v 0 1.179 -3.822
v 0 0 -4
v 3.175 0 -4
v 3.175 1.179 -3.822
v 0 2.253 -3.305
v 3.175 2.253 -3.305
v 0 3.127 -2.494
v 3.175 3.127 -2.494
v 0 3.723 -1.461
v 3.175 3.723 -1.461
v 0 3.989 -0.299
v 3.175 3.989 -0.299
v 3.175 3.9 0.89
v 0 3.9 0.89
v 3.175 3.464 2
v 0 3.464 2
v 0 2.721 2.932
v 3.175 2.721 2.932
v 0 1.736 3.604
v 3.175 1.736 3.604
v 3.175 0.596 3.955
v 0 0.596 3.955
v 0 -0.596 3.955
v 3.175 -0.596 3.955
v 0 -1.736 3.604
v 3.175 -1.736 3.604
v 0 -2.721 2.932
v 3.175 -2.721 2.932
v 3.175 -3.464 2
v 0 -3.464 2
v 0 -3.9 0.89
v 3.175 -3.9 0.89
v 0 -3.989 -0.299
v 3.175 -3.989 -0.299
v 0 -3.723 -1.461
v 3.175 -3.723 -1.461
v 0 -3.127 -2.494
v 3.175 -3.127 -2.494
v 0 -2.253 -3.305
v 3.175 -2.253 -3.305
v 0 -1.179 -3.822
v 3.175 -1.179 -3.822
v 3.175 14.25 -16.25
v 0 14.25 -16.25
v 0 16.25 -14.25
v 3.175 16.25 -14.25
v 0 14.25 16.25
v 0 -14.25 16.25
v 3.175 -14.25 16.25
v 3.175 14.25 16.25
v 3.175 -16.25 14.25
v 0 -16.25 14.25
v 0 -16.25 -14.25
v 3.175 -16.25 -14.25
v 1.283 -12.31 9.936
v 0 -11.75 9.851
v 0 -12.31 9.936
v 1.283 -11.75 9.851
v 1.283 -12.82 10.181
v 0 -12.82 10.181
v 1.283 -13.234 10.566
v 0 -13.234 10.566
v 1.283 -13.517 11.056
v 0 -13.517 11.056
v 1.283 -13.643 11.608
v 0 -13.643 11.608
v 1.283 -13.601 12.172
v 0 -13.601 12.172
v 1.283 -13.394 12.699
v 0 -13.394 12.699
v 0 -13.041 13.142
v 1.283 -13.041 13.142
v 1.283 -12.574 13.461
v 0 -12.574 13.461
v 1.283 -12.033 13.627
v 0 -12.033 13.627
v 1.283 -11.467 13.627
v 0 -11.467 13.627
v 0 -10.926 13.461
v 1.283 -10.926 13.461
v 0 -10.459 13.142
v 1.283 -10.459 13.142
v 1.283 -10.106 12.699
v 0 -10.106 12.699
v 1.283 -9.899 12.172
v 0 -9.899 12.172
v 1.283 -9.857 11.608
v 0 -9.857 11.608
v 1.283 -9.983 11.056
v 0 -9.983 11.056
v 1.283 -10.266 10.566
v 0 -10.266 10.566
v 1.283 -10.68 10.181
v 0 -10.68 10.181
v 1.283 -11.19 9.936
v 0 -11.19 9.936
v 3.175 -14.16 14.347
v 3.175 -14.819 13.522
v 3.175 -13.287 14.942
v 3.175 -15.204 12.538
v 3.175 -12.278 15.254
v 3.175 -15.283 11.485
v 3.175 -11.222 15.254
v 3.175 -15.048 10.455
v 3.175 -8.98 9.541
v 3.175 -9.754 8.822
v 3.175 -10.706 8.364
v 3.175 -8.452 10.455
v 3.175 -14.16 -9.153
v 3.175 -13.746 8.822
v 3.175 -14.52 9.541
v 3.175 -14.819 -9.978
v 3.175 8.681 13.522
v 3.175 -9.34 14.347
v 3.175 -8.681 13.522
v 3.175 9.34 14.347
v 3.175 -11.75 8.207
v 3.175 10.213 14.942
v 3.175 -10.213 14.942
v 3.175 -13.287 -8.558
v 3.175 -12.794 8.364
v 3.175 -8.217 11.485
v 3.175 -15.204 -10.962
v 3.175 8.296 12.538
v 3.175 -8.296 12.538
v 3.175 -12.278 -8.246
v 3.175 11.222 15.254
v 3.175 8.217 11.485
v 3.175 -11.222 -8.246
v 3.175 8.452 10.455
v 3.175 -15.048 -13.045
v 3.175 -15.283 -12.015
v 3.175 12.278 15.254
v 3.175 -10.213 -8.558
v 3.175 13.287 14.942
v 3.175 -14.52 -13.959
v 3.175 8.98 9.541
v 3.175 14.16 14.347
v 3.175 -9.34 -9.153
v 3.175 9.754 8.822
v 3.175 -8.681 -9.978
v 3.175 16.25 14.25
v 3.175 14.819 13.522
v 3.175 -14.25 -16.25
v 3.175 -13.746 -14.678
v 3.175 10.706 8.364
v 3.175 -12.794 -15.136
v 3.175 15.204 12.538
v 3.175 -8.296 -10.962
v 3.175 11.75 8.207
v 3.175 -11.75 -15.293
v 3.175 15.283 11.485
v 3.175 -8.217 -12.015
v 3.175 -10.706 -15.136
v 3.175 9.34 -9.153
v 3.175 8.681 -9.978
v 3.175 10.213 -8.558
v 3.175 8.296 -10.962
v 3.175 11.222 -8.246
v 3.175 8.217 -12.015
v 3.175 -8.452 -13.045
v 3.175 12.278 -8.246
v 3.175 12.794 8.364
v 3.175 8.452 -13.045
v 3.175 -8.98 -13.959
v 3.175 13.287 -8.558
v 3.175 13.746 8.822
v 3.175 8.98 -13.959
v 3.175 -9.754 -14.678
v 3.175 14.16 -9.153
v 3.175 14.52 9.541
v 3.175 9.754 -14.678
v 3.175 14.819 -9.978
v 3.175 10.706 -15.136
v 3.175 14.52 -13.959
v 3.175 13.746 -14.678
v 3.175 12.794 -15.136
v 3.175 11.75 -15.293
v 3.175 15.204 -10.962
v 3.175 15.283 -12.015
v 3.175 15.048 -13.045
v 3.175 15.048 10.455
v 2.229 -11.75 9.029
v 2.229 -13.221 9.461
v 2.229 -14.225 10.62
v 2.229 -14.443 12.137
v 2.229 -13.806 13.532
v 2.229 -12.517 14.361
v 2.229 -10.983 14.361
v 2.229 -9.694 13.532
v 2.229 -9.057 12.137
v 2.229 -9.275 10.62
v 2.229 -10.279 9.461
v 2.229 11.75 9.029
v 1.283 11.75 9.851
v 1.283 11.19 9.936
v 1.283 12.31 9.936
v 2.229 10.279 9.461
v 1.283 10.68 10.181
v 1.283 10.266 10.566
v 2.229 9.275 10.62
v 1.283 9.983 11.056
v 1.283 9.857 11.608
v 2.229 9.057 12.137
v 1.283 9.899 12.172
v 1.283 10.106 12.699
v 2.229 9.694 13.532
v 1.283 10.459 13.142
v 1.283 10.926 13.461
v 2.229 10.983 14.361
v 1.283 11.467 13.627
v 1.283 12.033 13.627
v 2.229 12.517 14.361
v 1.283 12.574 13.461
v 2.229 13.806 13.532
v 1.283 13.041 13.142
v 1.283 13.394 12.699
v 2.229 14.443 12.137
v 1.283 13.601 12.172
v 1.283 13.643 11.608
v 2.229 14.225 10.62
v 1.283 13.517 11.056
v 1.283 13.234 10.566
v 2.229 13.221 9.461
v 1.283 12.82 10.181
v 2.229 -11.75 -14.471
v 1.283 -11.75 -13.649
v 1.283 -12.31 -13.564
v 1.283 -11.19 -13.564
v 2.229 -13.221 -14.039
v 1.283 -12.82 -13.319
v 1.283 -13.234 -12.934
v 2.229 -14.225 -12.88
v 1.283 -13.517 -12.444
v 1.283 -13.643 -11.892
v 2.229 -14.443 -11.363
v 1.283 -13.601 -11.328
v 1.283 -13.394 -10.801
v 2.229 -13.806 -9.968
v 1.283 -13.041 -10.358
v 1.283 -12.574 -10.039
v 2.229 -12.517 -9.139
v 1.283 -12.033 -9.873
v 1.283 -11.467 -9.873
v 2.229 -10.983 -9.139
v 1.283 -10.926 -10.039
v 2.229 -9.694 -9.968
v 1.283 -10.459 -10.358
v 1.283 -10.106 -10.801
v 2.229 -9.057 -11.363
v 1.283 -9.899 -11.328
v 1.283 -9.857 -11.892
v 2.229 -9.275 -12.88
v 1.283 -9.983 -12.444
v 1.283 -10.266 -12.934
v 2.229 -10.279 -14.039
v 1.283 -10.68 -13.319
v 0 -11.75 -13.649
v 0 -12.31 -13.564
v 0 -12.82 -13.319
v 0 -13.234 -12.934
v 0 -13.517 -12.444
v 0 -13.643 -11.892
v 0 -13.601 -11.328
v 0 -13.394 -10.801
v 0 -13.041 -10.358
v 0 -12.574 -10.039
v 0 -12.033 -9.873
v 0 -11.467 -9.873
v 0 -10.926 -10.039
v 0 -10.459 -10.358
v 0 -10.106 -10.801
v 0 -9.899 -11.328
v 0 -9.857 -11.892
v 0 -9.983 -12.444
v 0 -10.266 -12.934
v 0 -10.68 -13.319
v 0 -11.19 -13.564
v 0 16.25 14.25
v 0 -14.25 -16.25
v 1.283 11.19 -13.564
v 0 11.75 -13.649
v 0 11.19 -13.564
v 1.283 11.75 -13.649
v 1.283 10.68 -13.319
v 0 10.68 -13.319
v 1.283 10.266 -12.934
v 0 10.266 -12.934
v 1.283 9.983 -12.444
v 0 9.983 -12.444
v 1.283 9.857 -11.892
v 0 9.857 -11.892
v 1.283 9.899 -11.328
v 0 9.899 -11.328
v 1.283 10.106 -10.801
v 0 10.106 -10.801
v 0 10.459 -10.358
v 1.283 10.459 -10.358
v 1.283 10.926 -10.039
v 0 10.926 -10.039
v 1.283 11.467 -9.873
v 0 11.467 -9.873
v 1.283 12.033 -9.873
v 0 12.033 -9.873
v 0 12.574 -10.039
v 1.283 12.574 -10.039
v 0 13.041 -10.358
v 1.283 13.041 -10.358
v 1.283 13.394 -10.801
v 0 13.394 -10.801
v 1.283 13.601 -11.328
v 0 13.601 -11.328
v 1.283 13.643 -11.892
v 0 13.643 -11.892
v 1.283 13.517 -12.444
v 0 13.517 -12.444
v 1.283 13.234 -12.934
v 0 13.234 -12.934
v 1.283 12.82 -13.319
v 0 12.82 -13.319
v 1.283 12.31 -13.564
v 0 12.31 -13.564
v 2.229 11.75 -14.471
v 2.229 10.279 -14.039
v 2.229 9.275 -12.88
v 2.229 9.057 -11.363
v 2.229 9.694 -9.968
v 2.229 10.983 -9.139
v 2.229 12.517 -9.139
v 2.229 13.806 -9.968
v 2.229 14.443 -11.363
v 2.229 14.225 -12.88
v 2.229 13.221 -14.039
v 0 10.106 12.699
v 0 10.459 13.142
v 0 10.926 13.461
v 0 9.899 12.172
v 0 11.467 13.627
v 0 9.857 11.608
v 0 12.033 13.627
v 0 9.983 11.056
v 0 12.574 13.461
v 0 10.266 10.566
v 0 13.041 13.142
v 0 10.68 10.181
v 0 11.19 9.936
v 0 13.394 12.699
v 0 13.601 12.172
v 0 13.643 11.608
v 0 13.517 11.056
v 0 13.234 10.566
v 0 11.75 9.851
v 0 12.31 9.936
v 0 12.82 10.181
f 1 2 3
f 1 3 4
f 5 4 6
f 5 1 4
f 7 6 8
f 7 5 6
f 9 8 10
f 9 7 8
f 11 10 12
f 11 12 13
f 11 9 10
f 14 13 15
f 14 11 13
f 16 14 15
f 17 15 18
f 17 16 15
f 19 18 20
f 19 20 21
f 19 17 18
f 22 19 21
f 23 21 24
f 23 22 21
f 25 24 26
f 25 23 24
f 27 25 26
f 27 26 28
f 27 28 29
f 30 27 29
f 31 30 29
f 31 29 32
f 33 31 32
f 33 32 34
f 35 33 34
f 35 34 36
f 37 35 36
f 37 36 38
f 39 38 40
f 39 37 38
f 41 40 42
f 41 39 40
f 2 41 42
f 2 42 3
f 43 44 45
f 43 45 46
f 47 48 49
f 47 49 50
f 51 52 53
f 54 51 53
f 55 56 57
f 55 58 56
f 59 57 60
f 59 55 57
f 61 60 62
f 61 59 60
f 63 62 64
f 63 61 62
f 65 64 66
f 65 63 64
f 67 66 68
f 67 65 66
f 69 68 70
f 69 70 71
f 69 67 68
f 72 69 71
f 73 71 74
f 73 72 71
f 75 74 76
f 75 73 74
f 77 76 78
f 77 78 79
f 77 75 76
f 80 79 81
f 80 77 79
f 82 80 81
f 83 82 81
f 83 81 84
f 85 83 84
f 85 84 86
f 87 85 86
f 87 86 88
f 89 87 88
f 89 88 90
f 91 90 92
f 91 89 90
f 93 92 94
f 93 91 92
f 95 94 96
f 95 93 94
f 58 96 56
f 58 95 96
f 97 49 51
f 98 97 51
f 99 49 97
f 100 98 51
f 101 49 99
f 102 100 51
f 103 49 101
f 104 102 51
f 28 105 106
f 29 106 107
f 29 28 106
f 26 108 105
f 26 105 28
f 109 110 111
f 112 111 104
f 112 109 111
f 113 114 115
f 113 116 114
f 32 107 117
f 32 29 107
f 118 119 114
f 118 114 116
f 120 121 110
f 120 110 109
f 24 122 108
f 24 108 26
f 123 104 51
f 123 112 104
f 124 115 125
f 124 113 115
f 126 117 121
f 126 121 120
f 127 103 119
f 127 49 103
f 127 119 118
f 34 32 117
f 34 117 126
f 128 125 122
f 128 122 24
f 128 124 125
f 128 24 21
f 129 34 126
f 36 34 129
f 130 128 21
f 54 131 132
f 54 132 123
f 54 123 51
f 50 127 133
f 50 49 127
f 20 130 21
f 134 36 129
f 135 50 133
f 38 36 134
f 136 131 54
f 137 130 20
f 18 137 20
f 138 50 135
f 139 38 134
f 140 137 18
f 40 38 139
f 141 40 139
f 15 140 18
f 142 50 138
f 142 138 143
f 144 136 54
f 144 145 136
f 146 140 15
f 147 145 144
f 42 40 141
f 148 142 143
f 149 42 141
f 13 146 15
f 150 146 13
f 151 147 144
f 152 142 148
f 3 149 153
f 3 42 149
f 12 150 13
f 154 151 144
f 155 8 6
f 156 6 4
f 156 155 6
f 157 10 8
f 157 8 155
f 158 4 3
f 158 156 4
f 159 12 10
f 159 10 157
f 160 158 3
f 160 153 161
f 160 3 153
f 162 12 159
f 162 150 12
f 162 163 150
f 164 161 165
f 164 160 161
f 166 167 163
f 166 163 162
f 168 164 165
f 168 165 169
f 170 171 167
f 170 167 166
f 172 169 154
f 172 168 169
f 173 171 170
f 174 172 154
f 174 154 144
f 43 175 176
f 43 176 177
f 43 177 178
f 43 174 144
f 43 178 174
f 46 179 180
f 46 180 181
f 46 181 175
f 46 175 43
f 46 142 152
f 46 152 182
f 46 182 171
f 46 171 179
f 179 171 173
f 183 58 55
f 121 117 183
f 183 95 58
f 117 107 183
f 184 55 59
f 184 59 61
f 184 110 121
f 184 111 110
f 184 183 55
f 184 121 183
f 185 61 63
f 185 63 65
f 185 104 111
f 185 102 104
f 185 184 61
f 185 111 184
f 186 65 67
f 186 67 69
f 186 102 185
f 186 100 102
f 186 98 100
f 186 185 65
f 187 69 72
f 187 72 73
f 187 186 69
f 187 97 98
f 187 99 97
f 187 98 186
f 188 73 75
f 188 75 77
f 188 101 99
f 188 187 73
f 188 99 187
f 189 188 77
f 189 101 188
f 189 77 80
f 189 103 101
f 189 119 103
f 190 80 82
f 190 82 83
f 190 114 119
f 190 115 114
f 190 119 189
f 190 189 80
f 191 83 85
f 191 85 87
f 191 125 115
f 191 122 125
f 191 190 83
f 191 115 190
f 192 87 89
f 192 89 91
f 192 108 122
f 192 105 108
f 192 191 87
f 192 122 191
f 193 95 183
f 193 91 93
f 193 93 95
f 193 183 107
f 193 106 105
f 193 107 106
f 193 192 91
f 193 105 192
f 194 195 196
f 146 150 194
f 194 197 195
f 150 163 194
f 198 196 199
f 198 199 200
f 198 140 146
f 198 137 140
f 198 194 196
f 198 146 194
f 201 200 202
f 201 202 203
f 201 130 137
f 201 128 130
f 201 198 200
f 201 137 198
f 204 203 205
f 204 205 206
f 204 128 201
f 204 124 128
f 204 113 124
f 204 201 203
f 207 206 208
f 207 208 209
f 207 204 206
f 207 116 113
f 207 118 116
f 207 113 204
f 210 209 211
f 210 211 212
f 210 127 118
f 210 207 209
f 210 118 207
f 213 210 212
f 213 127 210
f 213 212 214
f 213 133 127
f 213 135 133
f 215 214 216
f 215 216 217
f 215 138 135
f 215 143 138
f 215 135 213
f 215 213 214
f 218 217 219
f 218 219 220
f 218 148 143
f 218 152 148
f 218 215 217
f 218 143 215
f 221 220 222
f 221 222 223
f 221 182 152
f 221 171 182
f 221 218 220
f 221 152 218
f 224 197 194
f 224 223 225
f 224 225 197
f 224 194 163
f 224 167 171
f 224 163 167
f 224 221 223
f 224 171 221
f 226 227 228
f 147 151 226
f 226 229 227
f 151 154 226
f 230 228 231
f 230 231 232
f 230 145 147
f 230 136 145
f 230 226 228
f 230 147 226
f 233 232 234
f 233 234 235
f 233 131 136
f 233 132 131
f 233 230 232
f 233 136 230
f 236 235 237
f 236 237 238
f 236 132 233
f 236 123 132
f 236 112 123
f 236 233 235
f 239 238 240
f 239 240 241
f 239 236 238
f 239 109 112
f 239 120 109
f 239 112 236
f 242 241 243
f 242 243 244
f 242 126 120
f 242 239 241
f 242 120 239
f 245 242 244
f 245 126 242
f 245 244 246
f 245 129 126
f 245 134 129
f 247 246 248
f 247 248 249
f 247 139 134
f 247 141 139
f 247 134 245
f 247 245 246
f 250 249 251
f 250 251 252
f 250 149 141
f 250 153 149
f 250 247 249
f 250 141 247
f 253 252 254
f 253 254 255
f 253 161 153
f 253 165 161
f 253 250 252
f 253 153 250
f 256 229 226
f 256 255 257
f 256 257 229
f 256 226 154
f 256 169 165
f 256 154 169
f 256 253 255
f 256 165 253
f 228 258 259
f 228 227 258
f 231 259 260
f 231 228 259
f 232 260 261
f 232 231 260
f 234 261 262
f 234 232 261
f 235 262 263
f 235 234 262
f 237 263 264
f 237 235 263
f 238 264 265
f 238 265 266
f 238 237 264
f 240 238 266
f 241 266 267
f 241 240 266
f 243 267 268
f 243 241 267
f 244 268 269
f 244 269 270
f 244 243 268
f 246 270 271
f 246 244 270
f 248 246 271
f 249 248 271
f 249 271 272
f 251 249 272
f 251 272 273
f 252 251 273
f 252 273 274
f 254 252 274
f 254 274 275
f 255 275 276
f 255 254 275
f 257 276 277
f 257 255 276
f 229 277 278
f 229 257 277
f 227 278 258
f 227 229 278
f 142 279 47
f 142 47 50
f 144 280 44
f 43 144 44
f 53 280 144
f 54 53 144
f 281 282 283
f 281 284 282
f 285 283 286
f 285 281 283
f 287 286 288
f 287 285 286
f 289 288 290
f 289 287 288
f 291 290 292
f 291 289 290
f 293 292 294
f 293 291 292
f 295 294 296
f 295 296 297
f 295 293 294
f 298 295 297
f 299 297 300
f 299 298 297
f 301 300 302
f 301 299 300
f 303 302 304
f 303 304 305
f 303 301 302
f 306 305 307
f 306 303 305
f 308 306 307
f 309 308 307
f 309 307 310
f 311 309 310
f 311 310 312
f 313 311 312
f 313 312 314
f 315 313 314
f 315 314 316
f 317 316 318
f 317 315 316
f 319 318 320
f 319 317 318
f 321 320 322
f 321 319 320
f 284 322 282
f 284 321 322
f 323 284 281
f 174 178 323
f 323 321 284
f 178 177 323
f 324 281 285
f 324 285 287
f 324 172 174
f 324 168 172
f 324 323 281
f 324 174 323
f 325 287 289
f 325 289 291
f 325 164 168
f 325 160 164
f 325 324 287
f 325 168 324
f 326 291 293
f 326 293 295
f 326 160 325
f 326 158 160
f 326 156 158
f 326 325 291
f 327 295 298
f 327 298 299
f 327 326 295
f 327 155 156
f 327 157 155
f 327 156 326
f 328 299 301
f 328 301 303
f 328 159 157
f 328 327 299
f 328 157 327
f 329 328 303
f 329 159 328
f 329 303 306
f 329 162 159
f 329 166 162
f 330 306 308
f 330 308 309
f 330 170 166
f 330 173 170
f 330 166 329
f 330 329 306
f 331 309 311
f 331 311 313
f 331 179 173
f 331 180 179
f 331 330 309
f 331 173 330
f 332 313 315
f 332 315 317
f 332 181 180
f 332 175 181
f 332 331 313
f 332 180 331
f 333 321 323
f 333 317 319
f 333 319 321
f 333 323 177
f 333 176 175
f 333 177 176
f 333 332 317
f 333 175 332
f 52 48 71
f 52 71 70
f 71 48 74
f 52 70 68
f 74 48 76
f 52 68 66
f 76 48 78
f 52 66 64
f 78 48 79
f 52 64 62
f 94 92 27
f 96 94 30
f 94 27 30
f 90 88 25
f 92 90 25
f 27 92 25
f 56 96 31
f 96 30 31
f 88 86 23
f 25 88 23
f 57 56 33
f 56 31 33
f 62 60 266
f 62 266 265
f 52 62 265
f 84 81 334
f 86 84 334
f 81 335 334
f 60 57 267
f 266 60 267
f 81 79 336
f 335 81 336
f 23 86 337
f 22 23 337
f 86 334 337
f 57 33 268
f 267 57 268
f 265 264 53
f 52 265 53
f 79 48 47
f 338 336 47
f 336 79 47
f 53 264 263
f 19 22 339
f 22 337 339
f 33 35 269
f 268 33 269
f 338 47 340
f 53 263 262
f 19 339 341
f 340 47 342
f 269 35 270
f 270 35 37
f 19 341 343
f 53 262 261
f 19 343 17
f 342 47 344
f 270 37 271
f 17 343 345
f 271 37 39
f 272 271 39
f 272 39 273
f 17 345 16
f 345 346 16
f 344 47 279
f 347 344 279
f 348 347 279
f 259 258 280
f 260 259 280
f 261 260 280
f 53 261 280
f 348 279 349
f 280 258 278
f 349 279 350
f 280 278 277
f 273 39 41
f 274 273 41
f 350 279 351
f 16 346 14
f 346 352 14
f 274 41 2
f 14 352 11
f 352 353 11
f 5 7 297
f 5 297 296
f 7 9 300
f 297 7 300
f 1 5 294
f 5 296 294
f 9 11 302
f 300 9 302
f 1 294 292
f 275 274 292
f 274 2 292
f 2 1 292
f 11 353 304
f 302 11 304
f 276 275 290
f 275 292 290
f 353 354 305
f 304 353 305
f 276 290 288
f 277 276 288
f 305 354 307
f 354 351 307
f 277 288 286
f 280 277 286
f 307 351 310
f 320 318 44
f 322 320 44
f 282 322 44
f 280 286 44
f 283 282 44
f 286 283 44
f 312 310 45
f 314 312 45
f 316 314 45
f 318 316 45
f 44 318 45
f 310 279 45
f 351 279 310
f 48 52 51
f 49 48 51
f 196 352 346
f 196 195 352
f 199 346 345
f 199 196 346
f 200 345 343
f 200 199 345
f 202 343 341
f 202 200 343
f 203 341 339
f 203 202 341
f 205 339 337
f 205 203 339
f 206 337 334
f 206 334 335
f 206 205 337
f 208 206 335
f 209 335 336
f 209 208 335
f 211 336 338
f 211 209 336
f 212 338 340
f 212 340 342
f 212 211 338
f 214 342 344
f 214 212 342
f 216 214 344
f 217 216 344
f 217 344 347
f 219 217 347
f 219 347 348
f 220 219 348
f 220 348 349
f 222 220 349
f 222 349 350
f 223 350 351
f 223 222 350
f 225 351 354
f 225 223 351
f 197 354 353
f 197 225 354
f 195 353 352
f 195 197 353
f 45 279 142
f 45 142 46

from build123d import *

# Parameters (mm, degrees)
SKETCH1_W                                     = 32.5
SKETCH1_H                                     = 32.5
SKETCH1_R                                     = 4
BOSS_EXTRUDE1_DEPTH                           = 3.175
CHAMFER1_SIZE                                 = 2
CSK_FOR_6_FLAT_HEAD_MACHINE_SCREW1_AT_2_COUNT = 2
CSK_FOR_6_FLAT_HEAD_MACHINE_SCREW1_AT_2_PITCH = 23.5
CSK_FOR_6_FLAT_HEAD_MACHINE_SCREW1_AT_3_COUNT = 2
CSK_FOR_6_FLAT_HEAD_MACHINE_SCREW1_AT_3_PITCH = 33.234018716
CSK_FOR_6_FLAT_HEAD_MACHINE_SCREW1_AT_4_COUNT = 2
CSK_FOR_6_FLAT_HEAD_MACHINE_SCREW1_AT_4_PITCH = 23.5


with BuildPart() as part:
    # Sketch1 → Boss-Extrude1 (new body)
    with BuildSketch(Plane(origin=(0, 0, 0), x_dir=(0, 0, -1), z_dir=(1, 0, 0))):
        Rectangle(SKETCH1_W, SKETCH1_H)
        Circle(SKETCH1_R, mode=Mode.SUBTRACT)
    extrude(amount=BOSS_EXTRUDE1_DEPTH)

    # Chamfer1
    chamfer1_edges = [part.edges().sort_by_distance(p)[0] for p in [
        (1.5875, -16.25, -16.25),
        (1.5875, -16.25, 16.25),
        (1.5875, 16.25, -16.25),
        (1.5875, 16.25, 16.25),
    ]]
    chamfer(chamfer1_edges, length=CHAMFER1_SIZE)

    # Sketch3 → CSK for #6 Flat Head Machine Screw1 (revolve, cut)
    with BuildSketch(Plane(origin=(3.175, 11.75, 11.75), x_dir=(0, 0, -1), z_dir=(0, 1, 0))):
        Polygon((0, 0), (0, 3.175), (1.89865, 3.175), (1.89865, 1.891953401), (3.5433, 0), align=None)
    csk_for_6_flat_head_machine_screw1 = revolve(axis=Axis((9.525, 11.75, 11.75), (-1, 0, 0)), mode=Mode.SUBTRACT)

    # CSK for #6 Flat Head Machine Screw1 at 2: CSK for #6 Flat Head Machine Screw1 ×2
    with Locations(*[(0, 0, -i * CSK_FOR_6_FLAT_HEAD_MACHINE_SCREW1_AT_2_PITCH) for i in range(1, CSK_FOR_6_FLAT_HEAD_MACHINE_SCREW1_AT_2_COUNT)]):
        add(csk_for_6_flat_head_machine_screw1, mode=Mode.SUBTRACT)

    # CSK for #6 Flat Head Machine Screw1 at 3: CSK for #6 Flat Head Machine Screw1 ×2
    with Locations(*[Vector(0, -0.7071067811865476, -0.7071067811865476) * (i * CSK_FOR_6_FLAT_HEAD_MACHINE_SCREW1_AT_3_PITCH) for i in range(1, CSK_FOR_6_FLAT_HEAD_MACHINE_SCREW1_AT_3_COUNT)]):
        add(csk_for_6_flat_head_machine_screw1, mode=Mode.SUBTRACT)

    # CSK for #6 Flat Head Machine Screw1 at 4: CSK for #6 Flat Head Machine Screw1 ×2
    with Locations(*[(0, -i * CSK_FOR_6_FLAT_HEAD_MACHINE_SCREW1_AT_4_PITCH, 0) for i in range(1, CSK_FOR_6_FLAT_HEAD_MACHINE_SCREW1_AT_4_COUNT)]):
        add(csk_for_6_flat_head_machine_screw1, mode=Mode.SUBTRACT)


solid = part.part
